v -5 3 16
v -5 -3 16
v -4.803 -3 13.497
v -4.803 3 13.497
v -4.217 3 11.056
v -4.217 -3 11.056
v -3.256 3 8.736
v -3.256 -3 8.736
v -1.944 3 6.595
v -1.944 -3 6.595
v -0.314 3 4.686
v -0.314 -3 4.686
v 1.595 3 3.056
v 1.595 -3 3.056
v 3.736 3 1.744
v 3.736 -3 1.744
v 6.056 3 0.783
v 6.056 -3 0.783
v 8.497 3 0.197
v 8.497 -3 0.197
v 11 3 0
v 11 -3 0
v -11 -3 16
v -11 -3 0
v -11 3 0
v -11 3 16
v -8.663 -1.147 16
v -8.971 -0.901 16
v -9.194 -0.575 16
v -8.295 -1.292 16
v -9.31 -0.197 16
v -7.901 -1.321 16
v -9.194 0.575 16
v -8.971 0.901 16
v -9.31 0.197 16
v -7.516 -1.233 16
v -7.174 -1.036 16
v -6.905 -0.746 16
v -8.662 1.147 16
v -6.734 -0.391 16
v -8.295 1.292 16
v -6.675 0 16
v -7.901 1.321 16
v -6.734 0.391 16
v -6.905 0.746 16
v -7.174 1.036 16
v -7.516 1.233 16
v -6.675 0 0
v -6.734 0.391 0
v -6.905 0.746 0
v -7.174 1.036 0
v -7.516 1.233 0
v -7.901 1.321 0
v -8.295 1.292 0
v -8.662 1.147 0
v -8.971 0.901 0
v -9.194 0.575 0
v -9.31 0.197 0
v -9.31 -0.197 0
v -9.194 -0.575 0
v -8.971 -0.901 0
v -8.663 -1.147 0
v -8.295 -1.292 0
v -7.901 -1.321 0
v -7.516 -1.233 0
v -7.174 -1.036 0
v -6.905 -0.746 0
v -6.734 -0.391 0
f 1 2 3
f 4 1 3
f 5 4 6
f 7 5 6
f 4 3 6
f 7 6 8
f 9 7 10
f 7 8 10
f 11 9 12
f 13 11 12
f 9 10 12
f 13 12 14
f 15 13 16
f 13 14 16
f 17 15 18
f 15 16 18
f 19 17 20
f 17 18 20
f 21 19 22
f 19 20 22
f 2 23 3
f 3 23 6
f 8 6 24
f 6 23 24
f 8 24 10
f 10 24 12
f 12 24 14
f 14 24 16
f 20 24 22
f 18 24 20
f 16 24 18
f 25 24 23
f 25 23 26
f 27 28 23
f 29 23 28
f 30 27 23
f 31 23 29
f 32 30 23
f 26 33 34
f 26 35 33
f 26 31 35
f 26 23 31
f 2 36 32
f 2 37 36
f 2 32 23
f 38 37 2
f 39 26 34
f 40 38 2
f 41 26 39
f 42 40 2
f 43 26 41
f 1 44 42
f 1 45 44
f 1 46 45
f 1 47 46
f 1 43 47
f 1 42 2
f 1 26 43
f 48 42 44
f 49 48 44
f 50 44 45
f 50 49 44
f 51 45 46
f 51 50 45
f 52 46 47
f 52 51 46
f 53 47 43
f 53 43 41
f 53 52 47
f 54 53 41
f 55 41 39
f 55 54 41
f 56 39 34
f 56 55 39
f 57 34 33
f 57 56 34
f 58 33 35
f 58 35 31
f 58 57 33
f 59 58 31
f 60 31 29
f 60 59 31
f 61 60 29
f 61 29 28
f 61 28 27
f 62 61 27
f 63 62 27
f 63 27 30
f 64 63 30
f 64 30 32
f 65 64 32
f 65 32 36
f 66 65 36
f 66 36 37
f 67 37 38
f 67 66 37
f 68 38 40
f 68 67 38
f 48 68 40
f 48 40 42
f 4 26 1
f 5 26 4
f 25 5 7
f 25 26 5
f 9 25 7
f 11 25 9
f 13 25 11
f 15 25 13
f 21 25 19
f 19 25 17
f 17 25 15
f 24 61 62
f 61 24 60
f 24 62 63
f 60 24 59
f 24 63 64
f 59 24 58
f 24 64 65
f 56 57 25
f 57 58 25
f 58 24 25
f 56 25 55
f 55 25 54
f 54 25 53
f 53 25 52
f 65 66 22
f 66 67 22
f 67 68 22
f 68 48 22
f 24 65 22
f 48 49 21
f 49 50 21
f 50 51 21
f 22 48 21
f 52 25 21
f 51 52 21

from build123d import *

# Parameters (mm, degrees)
F0_W     = 22
F0_H     = 6
F0_R     = 1.325
F1_DEPTH = 16
F2_R     = 16
F3_DEPTH = 5


with BuildPart() as f1:
    # F0 (on Top) → F1 (new body)
    with BuildSketch(Plane.XY):
        Rectangle(F0_W, F0_H)
        with Locations((-8, 0)):
            Circle(F0_R, mode=Mode.SUBTRACT)
    extrude(amount=F1_DEPTH)

    # F2 (on Front) → F3 (cut, symmetric)
    with BuildSketch(Plane.XZ):
        with Locations((11, 16)):
            Circle(F2_R)
    extrude(amount=F3_DEPTH, both=True, mode=Mode.SUBTRACT)


solid = f1.part
